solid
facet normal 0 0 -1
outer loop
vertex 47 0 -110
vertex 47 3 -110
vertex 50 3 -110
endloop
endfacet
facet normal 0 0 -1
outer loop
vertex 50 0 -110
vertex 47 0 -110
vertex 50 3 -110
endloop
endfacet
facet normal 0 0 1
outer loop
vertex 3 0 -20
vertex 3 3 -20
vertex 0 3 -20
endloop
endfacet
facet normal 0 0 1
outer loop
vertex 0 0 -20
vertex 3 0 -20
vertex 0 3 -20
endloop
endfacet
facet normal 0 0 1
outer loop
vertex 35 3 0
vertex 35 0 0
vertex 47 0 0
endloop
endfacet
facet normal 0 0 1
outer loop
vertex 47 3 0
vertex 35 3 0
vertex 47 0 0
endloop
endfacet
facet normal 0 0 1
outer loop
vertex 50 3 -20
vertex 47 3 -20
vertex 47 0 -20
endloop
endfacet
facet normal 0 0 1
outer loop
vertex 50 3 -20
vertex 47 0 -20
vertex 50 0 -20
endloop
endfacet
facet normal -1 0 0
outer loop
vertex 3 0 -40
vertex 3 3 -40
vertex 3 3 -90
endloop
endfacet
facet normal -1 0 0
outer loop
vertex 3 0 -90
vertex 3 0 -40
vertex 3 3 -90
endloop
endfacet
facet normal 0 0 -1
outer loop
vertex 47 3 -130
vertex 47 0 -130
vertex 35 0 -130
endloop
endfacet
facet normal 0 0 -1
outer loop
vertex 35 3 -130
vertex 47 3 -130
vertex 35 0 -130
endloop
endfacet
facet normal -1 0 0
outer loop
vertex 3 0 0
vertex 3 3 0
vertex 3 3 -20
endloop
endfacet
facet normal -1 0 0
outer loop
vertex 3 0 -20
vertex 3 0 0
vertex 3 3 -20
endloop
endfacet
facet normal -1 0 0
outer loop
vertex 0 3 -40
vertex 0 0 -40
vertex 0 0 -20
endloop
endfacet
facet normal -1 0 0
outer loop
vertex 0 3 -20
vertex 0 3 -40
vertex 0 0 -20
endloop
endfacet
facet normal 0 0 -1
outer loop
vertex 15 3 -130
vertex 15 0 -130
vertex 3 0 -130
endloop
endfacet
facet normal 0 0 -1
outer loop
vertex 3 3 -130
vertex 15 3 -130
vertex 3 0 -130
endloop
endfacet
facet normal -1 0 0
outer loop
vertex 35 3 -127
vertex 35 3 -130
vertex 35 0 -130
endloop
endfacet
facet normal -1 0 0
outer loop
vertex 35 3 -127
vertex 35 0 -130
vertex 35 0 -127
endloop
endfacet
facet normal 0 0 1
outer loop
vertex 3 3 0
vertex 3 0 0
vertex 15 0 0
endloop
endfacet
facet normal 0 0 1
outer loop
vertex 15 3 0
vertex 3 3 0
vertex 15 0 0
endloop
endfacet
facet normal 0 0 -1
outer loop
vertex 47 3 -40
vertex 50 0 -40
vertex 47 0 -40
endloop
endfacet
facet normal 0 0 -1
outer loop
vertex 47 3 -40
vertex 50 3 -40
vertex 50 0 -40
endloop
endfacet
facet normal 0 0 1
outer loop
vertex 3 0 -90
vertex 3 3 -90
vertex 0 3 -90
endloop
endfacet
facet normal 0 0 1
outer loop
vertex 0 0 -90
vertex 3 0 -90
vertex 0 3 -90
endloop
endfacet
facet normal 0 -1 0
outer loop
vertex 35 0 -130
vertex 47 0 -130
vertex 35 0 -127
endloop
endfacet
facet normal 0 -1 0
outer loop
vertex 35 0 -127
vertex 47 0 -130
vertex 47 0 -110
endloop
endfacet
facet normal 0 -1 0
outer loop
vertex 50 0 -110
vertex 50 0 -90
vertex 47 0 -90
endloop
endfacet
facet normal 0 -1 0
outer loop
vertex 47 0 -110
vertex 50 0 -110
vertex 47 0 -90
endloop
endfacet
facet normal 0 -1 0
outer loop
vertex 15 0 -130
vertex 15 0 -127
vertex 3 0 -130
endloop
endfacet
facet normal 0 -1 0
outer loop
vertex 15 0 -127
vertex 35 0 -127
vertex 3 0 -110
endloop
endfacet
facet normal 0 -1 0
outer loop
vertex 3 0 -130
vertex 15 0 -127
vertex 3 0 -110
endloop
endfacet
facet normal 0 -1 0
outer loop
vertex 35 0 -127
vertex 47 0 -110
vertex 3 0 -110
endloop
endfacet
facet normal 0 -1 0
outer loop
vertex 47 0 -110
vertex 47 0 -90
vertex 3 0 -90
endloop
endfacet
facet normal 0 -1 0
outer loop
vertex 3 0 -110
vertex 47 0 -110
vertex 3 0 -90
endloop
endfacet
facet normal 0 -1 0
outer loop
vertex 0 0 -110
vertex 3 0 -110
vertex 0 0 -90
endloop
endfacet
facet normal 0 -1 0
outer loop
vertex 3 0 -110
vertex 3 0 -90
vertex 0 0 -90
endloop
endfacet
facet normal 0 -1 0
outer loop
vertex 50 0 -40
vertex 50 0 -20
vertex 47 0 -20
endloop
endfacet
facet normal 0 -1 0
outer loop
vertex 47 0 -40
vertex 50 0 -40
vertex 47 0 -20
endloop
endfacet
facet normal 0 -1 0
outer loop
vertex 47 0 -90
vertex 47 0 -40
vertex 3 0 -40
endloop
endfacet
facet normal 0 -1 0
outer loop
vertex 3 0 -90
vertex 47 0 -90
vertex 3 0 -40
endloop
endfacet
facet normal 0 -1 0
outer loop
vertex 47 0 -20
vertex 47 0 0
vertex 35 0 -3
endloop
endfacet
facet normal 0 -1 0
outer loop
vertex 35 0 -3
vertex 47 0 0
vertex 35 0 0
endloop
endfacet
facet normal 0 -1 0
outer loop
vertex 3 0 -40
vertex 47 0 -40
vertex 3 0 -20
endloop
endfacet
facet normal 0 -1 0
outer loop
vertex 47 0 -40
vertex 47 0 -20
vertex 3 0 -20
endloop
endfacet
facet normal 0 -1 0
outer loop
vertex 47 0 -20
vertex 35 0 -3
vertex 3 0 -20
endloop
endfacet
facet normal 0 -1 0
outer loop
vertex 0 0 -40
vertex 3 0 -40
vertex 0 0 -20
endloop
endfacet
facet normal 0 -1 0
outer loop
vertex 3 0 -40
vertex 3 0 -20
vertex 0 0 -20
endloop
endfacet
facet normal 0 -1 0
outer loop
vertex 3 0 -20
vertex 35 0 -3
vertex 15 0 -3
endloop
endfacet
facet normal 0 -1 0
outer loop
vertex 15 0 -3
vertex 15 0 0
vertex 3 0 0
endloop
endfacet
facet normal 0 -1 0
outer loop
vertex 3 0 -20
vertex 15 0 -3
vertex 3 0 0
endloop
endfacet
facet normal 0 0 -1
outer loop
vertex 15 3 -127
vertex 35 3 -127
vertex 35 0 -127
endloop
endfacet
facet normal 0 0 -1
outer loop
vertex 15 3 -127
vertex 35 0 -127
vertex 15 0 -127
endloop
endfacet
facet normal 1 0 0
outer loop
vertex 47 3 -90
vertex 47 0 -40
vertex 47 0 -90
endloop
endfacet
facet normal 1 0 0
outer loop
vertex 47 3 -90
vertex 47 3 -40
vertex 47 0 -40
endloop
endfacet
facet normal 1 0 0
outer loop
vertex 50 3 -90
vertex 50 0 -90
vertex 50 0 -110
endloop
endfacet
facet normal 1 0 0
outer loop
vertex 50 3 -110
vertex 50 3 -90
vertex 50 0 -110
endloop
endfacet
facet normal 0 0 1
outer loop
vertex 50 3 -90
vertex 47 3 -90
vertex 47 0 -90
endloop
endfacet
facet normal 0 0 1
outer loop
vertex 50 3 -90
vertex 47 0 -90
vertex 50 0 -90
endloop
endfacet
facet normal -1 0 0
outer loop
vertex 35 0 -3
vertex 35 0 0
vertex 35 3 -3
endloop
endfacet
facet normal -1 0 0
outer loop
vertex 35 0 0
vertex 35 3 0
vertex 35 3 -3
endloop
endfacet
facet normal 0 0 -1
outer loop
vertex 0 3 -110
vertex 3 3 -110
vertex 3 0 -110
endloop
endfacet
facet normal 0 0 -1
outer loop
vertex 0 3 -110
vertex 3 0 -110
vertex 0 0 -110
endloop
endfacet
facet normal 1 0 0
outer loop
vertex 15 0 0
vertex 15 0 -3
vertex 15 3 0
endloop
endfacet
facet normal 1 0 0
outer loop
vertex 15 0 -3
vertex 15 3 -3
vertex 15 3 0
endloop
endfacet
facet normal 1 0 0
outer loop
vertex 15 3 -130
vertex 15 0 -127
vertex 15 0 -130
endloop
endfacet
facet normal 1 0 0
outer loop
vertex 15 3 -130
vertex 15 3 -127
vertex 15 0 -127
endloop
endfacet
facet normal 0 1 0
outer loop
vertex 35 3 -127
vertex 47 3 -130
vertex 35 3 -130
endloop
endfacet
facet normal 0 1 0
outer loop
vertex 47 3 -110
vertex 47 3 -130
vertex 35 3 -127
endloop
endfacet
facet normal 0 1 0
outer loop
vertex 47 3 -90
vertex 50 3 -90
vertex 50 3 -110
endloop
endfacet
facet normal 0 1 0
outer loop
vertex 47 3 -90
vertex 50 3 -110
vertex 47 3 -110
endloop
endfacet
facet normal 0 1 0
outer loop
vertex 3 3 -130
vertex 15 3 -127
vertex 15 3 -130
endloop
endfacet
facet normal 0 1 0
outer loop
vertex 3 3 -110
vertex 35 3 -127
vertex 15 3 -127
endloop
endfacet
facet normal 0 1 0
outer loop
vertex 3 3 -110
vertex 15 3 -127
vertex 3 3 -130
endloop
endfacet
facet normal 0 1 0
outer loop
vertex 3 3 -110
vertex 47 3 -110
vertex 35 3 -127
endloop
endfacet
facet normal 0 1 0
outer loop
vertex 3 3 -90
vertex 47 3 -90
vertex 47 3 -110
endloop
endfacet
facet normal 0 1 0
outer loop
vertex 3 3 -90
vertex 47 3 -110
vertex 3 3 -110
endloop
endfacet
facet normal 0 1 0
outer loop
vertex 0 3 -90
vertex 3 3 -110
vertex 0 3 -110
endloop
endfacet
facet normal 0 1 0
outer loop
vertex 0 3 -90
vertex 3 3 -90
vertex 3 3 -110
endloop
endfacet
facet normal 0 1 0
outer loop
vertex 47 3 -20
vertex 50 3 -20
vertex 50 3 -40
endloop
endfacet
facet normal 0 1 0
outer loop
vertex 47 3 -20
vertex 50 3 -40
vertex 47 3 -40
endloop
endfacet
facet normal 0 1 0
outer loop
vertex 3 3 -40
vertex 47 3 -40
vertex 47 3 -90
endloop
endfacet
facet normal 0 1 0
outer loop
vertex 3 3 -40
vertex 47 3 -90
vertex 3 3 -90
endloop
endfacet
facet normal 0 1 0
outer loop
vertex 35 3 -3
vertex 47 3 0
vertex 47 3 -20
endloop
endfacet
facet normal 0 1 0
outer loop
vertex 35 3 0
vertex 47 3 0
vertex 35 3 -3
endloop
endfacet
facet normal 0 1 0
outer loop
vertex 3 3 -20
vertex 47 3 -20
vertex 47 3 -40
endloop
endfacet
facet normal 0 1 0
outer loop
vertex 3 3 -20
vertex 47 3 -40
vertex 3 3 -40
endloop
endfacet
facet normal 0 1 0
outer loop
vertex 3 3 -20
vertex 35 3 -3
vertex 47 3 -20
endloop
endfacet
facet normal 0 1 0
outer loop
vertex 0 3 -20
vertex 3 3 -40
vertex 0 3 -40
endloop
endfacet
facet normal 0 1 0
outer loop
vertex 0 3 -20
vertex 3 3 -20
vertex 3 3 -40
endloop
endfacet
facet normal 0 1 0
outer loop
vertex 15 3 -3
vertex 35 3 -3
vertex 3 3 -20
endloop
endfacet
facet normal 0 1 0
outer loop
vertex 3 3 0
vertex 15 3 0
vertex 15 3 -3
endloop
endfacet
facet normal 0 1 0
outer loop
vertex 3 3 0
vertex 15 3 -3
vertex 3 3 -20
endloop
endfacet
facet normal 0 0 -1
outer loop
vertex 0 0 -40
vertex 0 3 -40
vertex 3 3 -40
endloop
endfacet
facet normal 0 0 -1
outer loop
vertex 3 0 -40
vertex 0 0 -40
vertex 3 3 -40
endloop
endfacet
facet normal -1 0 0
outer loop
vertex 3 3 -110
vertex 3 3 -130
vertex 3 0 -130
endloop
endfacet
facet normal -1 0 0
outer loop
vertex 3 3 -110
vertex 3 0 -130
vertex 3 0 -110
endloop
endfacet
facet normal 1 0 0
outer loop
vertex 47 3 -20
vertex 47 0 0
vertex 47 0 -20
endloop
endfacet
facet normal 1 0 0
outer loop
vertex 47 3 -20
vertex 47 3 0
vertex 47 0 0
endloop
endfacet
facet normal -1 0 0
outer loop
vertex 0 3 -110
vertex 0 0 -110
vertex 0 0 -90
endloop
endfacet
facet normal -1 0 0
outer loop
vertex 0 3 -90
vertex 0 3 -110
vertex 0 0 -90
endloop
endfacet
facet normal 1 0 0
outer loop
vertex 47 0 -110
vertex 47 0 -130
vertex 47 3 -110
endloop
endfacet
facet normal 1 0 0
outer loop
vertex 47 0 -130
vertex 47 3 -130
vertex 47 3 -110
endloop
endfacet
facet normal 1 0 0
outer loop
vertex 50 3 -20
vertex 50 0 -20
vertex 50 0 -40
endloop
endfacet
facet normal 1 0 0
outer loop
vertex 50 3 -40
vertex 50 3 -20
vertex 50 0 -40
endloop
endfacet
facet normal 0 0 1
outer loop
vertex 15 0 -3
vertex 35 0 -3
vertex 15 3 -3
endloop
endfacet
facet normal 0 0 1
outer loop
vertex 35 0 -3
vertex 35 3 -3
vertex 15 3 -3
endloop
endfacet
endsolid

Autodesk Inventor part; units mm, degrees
ref_plane "YZ Plane" through (0, 0, 0) normal (1, 0, 0) x (0, 1, 0)
ref_plane "XZ Plane" through (0, 0, 0) normal (0, 1, 0) x (-1, 0, 0)
ref_plane "XY Plane" through (0, 0, 0) normal (0, 0, 1) x (1, 0, 0)
sketch "Sketch1" plane through (0, 0, 0) normal (0, 1, 0) x (-1, 0, 0)
  line L0 (0, 0) -> (-50, 0)
  line L1 (-50, 0) -> (-50, -130)
  line L2 (-50, -130) -> (0, -130)
  line L3 (0, -130) -> (0, 0)
  dimension "d0" = 130
  dimension "d1" = 50
extrude "Base" add sketch "Sketch1" along normal blind 3
sketch "Sketch2" plane through (0, 3, 0) normal (0, 1, 0) x (1, 0, 0)
  line L0 (0, 0) -> (50, 0) projected
  line L1 (50, 130) -> (0, 130) projected
  line L2 (0, 0) -> (3, 0)
  line L3 (3, 130) -> (0, 130)
  line L4 (0, 130) -> (0, 0)
  line L5 (0, 130) -> (0, 0) projected
  line L6 (0, 0) -> (3, 0)
  line L7 (3, 0) -> (3, 20)
  line L8 (3, 20) -> (0, 20)
  line L9 (0, 20) -> (0, 0)
  line L10 (0, 130) -> (3, 130)
  line L11 (3, 130) -> (3, 110)
  line L12 (3, 110) -> (0, 110)
  line L13 (0, 110) -> (0, 130)
  line L14 (0, 40) -> (3, 40)
  line L15 (3, 40) -> (3, 90)
  line L16 (3, 90) -> (0, 90)
  line L17 (0, 90) -> (0, 40)
  line L18 (25, 0) -> (25, 130) construction
  line L19 (50, 0) -> (47, 0)
  line L20 (47, 130) -> (50, 130)
  line L21 (50, 130) -> (50, 0)
  line L22 (50, 130) -> (50, 0)
  line L23 (50, 0) -> (47, 0)
  line L24 (47, 0) -> (47, 20)
  line L25 (47, 20) -> (50, 20)
  line L26 (50, 20) -> (50, 0)
  line L27 (50, 130) -> (47, 130)
  line L28 (47, 130) -> (47, 110)
  line L29 (47, 110) -> (50, 110)
  line L30 (50, 110) -> (50, 130)
  line L31 (50, 40) -> (47, 40)
  line L32 (47, 40) -> (47, 90)
  line L33 (47, 90) -> (50, 90)
  line L34 (50, 90) -> (50, 40)
  line L35 (15, 0) -> (35, 0)
  line L36 (35, 0) -> (35, 3)
  line L37 (35, 3) -> (15, 3)
  line L38 (15, 3) -> (15, 0)
  line L39 (0, 65) -> (50, 65) construction
  line L40 (50, 0) -> (50, 130) projected
  line L41 (35, 130) -> (35, 127)
  line L42 (35, 127) -> (15, 127)
  line L43 (15, 127) -> (15, 130)
  point P0 (0, 20)
  point P1 (0, 110)
  point P2 (0, 130)
  point P3 (0, 90)
  point P4 (0, 40)
  point P5 (15, 130)
  dimension "d10" = 20
  dimension "d11" = 20
  dimension "d12" = 20
  dimension "d13" = 20
  dimension "d14" = 50
  dimension "d15" = 3
  dimension "VerticalTab" = 20
  dimension "d19" = 10
  dimension "d20" = 3
extrude "Tabs" cut sketch "Sketch2" against normal through all contours L4 L8 L7 L0 | L38 L37 L36 L0 | L4 L16 L15 L14 | L24 L25 L21 L0 | L4 L1 L11 L12 | L31 L32 L33 L21 | L1 L41 L42 L43 | L29 L28 L1 L21
equation "\"d0\" = Length"
equation "\"d2\" = Thickness"
equation "\"d10\" = LengthTabOffset"
equation "\"d11\" = LengthTabOffset"
equation "\"d12\" = BaseTabWidth"
equation "\"d13\" = BaseTabWidth"
equation "\"d15\" = Thickness"
equation "\"d19\" = 0.5 * VerticalTab"
equation "\"d20\" = d15"
equation "\"Length\" = 130"
equation "\"Thickness\" = 3"
equation "\"LengthTabOffset\" = 20"
equation "\"BaseTabWidth\" = 20"
properties part number "LongSide"
